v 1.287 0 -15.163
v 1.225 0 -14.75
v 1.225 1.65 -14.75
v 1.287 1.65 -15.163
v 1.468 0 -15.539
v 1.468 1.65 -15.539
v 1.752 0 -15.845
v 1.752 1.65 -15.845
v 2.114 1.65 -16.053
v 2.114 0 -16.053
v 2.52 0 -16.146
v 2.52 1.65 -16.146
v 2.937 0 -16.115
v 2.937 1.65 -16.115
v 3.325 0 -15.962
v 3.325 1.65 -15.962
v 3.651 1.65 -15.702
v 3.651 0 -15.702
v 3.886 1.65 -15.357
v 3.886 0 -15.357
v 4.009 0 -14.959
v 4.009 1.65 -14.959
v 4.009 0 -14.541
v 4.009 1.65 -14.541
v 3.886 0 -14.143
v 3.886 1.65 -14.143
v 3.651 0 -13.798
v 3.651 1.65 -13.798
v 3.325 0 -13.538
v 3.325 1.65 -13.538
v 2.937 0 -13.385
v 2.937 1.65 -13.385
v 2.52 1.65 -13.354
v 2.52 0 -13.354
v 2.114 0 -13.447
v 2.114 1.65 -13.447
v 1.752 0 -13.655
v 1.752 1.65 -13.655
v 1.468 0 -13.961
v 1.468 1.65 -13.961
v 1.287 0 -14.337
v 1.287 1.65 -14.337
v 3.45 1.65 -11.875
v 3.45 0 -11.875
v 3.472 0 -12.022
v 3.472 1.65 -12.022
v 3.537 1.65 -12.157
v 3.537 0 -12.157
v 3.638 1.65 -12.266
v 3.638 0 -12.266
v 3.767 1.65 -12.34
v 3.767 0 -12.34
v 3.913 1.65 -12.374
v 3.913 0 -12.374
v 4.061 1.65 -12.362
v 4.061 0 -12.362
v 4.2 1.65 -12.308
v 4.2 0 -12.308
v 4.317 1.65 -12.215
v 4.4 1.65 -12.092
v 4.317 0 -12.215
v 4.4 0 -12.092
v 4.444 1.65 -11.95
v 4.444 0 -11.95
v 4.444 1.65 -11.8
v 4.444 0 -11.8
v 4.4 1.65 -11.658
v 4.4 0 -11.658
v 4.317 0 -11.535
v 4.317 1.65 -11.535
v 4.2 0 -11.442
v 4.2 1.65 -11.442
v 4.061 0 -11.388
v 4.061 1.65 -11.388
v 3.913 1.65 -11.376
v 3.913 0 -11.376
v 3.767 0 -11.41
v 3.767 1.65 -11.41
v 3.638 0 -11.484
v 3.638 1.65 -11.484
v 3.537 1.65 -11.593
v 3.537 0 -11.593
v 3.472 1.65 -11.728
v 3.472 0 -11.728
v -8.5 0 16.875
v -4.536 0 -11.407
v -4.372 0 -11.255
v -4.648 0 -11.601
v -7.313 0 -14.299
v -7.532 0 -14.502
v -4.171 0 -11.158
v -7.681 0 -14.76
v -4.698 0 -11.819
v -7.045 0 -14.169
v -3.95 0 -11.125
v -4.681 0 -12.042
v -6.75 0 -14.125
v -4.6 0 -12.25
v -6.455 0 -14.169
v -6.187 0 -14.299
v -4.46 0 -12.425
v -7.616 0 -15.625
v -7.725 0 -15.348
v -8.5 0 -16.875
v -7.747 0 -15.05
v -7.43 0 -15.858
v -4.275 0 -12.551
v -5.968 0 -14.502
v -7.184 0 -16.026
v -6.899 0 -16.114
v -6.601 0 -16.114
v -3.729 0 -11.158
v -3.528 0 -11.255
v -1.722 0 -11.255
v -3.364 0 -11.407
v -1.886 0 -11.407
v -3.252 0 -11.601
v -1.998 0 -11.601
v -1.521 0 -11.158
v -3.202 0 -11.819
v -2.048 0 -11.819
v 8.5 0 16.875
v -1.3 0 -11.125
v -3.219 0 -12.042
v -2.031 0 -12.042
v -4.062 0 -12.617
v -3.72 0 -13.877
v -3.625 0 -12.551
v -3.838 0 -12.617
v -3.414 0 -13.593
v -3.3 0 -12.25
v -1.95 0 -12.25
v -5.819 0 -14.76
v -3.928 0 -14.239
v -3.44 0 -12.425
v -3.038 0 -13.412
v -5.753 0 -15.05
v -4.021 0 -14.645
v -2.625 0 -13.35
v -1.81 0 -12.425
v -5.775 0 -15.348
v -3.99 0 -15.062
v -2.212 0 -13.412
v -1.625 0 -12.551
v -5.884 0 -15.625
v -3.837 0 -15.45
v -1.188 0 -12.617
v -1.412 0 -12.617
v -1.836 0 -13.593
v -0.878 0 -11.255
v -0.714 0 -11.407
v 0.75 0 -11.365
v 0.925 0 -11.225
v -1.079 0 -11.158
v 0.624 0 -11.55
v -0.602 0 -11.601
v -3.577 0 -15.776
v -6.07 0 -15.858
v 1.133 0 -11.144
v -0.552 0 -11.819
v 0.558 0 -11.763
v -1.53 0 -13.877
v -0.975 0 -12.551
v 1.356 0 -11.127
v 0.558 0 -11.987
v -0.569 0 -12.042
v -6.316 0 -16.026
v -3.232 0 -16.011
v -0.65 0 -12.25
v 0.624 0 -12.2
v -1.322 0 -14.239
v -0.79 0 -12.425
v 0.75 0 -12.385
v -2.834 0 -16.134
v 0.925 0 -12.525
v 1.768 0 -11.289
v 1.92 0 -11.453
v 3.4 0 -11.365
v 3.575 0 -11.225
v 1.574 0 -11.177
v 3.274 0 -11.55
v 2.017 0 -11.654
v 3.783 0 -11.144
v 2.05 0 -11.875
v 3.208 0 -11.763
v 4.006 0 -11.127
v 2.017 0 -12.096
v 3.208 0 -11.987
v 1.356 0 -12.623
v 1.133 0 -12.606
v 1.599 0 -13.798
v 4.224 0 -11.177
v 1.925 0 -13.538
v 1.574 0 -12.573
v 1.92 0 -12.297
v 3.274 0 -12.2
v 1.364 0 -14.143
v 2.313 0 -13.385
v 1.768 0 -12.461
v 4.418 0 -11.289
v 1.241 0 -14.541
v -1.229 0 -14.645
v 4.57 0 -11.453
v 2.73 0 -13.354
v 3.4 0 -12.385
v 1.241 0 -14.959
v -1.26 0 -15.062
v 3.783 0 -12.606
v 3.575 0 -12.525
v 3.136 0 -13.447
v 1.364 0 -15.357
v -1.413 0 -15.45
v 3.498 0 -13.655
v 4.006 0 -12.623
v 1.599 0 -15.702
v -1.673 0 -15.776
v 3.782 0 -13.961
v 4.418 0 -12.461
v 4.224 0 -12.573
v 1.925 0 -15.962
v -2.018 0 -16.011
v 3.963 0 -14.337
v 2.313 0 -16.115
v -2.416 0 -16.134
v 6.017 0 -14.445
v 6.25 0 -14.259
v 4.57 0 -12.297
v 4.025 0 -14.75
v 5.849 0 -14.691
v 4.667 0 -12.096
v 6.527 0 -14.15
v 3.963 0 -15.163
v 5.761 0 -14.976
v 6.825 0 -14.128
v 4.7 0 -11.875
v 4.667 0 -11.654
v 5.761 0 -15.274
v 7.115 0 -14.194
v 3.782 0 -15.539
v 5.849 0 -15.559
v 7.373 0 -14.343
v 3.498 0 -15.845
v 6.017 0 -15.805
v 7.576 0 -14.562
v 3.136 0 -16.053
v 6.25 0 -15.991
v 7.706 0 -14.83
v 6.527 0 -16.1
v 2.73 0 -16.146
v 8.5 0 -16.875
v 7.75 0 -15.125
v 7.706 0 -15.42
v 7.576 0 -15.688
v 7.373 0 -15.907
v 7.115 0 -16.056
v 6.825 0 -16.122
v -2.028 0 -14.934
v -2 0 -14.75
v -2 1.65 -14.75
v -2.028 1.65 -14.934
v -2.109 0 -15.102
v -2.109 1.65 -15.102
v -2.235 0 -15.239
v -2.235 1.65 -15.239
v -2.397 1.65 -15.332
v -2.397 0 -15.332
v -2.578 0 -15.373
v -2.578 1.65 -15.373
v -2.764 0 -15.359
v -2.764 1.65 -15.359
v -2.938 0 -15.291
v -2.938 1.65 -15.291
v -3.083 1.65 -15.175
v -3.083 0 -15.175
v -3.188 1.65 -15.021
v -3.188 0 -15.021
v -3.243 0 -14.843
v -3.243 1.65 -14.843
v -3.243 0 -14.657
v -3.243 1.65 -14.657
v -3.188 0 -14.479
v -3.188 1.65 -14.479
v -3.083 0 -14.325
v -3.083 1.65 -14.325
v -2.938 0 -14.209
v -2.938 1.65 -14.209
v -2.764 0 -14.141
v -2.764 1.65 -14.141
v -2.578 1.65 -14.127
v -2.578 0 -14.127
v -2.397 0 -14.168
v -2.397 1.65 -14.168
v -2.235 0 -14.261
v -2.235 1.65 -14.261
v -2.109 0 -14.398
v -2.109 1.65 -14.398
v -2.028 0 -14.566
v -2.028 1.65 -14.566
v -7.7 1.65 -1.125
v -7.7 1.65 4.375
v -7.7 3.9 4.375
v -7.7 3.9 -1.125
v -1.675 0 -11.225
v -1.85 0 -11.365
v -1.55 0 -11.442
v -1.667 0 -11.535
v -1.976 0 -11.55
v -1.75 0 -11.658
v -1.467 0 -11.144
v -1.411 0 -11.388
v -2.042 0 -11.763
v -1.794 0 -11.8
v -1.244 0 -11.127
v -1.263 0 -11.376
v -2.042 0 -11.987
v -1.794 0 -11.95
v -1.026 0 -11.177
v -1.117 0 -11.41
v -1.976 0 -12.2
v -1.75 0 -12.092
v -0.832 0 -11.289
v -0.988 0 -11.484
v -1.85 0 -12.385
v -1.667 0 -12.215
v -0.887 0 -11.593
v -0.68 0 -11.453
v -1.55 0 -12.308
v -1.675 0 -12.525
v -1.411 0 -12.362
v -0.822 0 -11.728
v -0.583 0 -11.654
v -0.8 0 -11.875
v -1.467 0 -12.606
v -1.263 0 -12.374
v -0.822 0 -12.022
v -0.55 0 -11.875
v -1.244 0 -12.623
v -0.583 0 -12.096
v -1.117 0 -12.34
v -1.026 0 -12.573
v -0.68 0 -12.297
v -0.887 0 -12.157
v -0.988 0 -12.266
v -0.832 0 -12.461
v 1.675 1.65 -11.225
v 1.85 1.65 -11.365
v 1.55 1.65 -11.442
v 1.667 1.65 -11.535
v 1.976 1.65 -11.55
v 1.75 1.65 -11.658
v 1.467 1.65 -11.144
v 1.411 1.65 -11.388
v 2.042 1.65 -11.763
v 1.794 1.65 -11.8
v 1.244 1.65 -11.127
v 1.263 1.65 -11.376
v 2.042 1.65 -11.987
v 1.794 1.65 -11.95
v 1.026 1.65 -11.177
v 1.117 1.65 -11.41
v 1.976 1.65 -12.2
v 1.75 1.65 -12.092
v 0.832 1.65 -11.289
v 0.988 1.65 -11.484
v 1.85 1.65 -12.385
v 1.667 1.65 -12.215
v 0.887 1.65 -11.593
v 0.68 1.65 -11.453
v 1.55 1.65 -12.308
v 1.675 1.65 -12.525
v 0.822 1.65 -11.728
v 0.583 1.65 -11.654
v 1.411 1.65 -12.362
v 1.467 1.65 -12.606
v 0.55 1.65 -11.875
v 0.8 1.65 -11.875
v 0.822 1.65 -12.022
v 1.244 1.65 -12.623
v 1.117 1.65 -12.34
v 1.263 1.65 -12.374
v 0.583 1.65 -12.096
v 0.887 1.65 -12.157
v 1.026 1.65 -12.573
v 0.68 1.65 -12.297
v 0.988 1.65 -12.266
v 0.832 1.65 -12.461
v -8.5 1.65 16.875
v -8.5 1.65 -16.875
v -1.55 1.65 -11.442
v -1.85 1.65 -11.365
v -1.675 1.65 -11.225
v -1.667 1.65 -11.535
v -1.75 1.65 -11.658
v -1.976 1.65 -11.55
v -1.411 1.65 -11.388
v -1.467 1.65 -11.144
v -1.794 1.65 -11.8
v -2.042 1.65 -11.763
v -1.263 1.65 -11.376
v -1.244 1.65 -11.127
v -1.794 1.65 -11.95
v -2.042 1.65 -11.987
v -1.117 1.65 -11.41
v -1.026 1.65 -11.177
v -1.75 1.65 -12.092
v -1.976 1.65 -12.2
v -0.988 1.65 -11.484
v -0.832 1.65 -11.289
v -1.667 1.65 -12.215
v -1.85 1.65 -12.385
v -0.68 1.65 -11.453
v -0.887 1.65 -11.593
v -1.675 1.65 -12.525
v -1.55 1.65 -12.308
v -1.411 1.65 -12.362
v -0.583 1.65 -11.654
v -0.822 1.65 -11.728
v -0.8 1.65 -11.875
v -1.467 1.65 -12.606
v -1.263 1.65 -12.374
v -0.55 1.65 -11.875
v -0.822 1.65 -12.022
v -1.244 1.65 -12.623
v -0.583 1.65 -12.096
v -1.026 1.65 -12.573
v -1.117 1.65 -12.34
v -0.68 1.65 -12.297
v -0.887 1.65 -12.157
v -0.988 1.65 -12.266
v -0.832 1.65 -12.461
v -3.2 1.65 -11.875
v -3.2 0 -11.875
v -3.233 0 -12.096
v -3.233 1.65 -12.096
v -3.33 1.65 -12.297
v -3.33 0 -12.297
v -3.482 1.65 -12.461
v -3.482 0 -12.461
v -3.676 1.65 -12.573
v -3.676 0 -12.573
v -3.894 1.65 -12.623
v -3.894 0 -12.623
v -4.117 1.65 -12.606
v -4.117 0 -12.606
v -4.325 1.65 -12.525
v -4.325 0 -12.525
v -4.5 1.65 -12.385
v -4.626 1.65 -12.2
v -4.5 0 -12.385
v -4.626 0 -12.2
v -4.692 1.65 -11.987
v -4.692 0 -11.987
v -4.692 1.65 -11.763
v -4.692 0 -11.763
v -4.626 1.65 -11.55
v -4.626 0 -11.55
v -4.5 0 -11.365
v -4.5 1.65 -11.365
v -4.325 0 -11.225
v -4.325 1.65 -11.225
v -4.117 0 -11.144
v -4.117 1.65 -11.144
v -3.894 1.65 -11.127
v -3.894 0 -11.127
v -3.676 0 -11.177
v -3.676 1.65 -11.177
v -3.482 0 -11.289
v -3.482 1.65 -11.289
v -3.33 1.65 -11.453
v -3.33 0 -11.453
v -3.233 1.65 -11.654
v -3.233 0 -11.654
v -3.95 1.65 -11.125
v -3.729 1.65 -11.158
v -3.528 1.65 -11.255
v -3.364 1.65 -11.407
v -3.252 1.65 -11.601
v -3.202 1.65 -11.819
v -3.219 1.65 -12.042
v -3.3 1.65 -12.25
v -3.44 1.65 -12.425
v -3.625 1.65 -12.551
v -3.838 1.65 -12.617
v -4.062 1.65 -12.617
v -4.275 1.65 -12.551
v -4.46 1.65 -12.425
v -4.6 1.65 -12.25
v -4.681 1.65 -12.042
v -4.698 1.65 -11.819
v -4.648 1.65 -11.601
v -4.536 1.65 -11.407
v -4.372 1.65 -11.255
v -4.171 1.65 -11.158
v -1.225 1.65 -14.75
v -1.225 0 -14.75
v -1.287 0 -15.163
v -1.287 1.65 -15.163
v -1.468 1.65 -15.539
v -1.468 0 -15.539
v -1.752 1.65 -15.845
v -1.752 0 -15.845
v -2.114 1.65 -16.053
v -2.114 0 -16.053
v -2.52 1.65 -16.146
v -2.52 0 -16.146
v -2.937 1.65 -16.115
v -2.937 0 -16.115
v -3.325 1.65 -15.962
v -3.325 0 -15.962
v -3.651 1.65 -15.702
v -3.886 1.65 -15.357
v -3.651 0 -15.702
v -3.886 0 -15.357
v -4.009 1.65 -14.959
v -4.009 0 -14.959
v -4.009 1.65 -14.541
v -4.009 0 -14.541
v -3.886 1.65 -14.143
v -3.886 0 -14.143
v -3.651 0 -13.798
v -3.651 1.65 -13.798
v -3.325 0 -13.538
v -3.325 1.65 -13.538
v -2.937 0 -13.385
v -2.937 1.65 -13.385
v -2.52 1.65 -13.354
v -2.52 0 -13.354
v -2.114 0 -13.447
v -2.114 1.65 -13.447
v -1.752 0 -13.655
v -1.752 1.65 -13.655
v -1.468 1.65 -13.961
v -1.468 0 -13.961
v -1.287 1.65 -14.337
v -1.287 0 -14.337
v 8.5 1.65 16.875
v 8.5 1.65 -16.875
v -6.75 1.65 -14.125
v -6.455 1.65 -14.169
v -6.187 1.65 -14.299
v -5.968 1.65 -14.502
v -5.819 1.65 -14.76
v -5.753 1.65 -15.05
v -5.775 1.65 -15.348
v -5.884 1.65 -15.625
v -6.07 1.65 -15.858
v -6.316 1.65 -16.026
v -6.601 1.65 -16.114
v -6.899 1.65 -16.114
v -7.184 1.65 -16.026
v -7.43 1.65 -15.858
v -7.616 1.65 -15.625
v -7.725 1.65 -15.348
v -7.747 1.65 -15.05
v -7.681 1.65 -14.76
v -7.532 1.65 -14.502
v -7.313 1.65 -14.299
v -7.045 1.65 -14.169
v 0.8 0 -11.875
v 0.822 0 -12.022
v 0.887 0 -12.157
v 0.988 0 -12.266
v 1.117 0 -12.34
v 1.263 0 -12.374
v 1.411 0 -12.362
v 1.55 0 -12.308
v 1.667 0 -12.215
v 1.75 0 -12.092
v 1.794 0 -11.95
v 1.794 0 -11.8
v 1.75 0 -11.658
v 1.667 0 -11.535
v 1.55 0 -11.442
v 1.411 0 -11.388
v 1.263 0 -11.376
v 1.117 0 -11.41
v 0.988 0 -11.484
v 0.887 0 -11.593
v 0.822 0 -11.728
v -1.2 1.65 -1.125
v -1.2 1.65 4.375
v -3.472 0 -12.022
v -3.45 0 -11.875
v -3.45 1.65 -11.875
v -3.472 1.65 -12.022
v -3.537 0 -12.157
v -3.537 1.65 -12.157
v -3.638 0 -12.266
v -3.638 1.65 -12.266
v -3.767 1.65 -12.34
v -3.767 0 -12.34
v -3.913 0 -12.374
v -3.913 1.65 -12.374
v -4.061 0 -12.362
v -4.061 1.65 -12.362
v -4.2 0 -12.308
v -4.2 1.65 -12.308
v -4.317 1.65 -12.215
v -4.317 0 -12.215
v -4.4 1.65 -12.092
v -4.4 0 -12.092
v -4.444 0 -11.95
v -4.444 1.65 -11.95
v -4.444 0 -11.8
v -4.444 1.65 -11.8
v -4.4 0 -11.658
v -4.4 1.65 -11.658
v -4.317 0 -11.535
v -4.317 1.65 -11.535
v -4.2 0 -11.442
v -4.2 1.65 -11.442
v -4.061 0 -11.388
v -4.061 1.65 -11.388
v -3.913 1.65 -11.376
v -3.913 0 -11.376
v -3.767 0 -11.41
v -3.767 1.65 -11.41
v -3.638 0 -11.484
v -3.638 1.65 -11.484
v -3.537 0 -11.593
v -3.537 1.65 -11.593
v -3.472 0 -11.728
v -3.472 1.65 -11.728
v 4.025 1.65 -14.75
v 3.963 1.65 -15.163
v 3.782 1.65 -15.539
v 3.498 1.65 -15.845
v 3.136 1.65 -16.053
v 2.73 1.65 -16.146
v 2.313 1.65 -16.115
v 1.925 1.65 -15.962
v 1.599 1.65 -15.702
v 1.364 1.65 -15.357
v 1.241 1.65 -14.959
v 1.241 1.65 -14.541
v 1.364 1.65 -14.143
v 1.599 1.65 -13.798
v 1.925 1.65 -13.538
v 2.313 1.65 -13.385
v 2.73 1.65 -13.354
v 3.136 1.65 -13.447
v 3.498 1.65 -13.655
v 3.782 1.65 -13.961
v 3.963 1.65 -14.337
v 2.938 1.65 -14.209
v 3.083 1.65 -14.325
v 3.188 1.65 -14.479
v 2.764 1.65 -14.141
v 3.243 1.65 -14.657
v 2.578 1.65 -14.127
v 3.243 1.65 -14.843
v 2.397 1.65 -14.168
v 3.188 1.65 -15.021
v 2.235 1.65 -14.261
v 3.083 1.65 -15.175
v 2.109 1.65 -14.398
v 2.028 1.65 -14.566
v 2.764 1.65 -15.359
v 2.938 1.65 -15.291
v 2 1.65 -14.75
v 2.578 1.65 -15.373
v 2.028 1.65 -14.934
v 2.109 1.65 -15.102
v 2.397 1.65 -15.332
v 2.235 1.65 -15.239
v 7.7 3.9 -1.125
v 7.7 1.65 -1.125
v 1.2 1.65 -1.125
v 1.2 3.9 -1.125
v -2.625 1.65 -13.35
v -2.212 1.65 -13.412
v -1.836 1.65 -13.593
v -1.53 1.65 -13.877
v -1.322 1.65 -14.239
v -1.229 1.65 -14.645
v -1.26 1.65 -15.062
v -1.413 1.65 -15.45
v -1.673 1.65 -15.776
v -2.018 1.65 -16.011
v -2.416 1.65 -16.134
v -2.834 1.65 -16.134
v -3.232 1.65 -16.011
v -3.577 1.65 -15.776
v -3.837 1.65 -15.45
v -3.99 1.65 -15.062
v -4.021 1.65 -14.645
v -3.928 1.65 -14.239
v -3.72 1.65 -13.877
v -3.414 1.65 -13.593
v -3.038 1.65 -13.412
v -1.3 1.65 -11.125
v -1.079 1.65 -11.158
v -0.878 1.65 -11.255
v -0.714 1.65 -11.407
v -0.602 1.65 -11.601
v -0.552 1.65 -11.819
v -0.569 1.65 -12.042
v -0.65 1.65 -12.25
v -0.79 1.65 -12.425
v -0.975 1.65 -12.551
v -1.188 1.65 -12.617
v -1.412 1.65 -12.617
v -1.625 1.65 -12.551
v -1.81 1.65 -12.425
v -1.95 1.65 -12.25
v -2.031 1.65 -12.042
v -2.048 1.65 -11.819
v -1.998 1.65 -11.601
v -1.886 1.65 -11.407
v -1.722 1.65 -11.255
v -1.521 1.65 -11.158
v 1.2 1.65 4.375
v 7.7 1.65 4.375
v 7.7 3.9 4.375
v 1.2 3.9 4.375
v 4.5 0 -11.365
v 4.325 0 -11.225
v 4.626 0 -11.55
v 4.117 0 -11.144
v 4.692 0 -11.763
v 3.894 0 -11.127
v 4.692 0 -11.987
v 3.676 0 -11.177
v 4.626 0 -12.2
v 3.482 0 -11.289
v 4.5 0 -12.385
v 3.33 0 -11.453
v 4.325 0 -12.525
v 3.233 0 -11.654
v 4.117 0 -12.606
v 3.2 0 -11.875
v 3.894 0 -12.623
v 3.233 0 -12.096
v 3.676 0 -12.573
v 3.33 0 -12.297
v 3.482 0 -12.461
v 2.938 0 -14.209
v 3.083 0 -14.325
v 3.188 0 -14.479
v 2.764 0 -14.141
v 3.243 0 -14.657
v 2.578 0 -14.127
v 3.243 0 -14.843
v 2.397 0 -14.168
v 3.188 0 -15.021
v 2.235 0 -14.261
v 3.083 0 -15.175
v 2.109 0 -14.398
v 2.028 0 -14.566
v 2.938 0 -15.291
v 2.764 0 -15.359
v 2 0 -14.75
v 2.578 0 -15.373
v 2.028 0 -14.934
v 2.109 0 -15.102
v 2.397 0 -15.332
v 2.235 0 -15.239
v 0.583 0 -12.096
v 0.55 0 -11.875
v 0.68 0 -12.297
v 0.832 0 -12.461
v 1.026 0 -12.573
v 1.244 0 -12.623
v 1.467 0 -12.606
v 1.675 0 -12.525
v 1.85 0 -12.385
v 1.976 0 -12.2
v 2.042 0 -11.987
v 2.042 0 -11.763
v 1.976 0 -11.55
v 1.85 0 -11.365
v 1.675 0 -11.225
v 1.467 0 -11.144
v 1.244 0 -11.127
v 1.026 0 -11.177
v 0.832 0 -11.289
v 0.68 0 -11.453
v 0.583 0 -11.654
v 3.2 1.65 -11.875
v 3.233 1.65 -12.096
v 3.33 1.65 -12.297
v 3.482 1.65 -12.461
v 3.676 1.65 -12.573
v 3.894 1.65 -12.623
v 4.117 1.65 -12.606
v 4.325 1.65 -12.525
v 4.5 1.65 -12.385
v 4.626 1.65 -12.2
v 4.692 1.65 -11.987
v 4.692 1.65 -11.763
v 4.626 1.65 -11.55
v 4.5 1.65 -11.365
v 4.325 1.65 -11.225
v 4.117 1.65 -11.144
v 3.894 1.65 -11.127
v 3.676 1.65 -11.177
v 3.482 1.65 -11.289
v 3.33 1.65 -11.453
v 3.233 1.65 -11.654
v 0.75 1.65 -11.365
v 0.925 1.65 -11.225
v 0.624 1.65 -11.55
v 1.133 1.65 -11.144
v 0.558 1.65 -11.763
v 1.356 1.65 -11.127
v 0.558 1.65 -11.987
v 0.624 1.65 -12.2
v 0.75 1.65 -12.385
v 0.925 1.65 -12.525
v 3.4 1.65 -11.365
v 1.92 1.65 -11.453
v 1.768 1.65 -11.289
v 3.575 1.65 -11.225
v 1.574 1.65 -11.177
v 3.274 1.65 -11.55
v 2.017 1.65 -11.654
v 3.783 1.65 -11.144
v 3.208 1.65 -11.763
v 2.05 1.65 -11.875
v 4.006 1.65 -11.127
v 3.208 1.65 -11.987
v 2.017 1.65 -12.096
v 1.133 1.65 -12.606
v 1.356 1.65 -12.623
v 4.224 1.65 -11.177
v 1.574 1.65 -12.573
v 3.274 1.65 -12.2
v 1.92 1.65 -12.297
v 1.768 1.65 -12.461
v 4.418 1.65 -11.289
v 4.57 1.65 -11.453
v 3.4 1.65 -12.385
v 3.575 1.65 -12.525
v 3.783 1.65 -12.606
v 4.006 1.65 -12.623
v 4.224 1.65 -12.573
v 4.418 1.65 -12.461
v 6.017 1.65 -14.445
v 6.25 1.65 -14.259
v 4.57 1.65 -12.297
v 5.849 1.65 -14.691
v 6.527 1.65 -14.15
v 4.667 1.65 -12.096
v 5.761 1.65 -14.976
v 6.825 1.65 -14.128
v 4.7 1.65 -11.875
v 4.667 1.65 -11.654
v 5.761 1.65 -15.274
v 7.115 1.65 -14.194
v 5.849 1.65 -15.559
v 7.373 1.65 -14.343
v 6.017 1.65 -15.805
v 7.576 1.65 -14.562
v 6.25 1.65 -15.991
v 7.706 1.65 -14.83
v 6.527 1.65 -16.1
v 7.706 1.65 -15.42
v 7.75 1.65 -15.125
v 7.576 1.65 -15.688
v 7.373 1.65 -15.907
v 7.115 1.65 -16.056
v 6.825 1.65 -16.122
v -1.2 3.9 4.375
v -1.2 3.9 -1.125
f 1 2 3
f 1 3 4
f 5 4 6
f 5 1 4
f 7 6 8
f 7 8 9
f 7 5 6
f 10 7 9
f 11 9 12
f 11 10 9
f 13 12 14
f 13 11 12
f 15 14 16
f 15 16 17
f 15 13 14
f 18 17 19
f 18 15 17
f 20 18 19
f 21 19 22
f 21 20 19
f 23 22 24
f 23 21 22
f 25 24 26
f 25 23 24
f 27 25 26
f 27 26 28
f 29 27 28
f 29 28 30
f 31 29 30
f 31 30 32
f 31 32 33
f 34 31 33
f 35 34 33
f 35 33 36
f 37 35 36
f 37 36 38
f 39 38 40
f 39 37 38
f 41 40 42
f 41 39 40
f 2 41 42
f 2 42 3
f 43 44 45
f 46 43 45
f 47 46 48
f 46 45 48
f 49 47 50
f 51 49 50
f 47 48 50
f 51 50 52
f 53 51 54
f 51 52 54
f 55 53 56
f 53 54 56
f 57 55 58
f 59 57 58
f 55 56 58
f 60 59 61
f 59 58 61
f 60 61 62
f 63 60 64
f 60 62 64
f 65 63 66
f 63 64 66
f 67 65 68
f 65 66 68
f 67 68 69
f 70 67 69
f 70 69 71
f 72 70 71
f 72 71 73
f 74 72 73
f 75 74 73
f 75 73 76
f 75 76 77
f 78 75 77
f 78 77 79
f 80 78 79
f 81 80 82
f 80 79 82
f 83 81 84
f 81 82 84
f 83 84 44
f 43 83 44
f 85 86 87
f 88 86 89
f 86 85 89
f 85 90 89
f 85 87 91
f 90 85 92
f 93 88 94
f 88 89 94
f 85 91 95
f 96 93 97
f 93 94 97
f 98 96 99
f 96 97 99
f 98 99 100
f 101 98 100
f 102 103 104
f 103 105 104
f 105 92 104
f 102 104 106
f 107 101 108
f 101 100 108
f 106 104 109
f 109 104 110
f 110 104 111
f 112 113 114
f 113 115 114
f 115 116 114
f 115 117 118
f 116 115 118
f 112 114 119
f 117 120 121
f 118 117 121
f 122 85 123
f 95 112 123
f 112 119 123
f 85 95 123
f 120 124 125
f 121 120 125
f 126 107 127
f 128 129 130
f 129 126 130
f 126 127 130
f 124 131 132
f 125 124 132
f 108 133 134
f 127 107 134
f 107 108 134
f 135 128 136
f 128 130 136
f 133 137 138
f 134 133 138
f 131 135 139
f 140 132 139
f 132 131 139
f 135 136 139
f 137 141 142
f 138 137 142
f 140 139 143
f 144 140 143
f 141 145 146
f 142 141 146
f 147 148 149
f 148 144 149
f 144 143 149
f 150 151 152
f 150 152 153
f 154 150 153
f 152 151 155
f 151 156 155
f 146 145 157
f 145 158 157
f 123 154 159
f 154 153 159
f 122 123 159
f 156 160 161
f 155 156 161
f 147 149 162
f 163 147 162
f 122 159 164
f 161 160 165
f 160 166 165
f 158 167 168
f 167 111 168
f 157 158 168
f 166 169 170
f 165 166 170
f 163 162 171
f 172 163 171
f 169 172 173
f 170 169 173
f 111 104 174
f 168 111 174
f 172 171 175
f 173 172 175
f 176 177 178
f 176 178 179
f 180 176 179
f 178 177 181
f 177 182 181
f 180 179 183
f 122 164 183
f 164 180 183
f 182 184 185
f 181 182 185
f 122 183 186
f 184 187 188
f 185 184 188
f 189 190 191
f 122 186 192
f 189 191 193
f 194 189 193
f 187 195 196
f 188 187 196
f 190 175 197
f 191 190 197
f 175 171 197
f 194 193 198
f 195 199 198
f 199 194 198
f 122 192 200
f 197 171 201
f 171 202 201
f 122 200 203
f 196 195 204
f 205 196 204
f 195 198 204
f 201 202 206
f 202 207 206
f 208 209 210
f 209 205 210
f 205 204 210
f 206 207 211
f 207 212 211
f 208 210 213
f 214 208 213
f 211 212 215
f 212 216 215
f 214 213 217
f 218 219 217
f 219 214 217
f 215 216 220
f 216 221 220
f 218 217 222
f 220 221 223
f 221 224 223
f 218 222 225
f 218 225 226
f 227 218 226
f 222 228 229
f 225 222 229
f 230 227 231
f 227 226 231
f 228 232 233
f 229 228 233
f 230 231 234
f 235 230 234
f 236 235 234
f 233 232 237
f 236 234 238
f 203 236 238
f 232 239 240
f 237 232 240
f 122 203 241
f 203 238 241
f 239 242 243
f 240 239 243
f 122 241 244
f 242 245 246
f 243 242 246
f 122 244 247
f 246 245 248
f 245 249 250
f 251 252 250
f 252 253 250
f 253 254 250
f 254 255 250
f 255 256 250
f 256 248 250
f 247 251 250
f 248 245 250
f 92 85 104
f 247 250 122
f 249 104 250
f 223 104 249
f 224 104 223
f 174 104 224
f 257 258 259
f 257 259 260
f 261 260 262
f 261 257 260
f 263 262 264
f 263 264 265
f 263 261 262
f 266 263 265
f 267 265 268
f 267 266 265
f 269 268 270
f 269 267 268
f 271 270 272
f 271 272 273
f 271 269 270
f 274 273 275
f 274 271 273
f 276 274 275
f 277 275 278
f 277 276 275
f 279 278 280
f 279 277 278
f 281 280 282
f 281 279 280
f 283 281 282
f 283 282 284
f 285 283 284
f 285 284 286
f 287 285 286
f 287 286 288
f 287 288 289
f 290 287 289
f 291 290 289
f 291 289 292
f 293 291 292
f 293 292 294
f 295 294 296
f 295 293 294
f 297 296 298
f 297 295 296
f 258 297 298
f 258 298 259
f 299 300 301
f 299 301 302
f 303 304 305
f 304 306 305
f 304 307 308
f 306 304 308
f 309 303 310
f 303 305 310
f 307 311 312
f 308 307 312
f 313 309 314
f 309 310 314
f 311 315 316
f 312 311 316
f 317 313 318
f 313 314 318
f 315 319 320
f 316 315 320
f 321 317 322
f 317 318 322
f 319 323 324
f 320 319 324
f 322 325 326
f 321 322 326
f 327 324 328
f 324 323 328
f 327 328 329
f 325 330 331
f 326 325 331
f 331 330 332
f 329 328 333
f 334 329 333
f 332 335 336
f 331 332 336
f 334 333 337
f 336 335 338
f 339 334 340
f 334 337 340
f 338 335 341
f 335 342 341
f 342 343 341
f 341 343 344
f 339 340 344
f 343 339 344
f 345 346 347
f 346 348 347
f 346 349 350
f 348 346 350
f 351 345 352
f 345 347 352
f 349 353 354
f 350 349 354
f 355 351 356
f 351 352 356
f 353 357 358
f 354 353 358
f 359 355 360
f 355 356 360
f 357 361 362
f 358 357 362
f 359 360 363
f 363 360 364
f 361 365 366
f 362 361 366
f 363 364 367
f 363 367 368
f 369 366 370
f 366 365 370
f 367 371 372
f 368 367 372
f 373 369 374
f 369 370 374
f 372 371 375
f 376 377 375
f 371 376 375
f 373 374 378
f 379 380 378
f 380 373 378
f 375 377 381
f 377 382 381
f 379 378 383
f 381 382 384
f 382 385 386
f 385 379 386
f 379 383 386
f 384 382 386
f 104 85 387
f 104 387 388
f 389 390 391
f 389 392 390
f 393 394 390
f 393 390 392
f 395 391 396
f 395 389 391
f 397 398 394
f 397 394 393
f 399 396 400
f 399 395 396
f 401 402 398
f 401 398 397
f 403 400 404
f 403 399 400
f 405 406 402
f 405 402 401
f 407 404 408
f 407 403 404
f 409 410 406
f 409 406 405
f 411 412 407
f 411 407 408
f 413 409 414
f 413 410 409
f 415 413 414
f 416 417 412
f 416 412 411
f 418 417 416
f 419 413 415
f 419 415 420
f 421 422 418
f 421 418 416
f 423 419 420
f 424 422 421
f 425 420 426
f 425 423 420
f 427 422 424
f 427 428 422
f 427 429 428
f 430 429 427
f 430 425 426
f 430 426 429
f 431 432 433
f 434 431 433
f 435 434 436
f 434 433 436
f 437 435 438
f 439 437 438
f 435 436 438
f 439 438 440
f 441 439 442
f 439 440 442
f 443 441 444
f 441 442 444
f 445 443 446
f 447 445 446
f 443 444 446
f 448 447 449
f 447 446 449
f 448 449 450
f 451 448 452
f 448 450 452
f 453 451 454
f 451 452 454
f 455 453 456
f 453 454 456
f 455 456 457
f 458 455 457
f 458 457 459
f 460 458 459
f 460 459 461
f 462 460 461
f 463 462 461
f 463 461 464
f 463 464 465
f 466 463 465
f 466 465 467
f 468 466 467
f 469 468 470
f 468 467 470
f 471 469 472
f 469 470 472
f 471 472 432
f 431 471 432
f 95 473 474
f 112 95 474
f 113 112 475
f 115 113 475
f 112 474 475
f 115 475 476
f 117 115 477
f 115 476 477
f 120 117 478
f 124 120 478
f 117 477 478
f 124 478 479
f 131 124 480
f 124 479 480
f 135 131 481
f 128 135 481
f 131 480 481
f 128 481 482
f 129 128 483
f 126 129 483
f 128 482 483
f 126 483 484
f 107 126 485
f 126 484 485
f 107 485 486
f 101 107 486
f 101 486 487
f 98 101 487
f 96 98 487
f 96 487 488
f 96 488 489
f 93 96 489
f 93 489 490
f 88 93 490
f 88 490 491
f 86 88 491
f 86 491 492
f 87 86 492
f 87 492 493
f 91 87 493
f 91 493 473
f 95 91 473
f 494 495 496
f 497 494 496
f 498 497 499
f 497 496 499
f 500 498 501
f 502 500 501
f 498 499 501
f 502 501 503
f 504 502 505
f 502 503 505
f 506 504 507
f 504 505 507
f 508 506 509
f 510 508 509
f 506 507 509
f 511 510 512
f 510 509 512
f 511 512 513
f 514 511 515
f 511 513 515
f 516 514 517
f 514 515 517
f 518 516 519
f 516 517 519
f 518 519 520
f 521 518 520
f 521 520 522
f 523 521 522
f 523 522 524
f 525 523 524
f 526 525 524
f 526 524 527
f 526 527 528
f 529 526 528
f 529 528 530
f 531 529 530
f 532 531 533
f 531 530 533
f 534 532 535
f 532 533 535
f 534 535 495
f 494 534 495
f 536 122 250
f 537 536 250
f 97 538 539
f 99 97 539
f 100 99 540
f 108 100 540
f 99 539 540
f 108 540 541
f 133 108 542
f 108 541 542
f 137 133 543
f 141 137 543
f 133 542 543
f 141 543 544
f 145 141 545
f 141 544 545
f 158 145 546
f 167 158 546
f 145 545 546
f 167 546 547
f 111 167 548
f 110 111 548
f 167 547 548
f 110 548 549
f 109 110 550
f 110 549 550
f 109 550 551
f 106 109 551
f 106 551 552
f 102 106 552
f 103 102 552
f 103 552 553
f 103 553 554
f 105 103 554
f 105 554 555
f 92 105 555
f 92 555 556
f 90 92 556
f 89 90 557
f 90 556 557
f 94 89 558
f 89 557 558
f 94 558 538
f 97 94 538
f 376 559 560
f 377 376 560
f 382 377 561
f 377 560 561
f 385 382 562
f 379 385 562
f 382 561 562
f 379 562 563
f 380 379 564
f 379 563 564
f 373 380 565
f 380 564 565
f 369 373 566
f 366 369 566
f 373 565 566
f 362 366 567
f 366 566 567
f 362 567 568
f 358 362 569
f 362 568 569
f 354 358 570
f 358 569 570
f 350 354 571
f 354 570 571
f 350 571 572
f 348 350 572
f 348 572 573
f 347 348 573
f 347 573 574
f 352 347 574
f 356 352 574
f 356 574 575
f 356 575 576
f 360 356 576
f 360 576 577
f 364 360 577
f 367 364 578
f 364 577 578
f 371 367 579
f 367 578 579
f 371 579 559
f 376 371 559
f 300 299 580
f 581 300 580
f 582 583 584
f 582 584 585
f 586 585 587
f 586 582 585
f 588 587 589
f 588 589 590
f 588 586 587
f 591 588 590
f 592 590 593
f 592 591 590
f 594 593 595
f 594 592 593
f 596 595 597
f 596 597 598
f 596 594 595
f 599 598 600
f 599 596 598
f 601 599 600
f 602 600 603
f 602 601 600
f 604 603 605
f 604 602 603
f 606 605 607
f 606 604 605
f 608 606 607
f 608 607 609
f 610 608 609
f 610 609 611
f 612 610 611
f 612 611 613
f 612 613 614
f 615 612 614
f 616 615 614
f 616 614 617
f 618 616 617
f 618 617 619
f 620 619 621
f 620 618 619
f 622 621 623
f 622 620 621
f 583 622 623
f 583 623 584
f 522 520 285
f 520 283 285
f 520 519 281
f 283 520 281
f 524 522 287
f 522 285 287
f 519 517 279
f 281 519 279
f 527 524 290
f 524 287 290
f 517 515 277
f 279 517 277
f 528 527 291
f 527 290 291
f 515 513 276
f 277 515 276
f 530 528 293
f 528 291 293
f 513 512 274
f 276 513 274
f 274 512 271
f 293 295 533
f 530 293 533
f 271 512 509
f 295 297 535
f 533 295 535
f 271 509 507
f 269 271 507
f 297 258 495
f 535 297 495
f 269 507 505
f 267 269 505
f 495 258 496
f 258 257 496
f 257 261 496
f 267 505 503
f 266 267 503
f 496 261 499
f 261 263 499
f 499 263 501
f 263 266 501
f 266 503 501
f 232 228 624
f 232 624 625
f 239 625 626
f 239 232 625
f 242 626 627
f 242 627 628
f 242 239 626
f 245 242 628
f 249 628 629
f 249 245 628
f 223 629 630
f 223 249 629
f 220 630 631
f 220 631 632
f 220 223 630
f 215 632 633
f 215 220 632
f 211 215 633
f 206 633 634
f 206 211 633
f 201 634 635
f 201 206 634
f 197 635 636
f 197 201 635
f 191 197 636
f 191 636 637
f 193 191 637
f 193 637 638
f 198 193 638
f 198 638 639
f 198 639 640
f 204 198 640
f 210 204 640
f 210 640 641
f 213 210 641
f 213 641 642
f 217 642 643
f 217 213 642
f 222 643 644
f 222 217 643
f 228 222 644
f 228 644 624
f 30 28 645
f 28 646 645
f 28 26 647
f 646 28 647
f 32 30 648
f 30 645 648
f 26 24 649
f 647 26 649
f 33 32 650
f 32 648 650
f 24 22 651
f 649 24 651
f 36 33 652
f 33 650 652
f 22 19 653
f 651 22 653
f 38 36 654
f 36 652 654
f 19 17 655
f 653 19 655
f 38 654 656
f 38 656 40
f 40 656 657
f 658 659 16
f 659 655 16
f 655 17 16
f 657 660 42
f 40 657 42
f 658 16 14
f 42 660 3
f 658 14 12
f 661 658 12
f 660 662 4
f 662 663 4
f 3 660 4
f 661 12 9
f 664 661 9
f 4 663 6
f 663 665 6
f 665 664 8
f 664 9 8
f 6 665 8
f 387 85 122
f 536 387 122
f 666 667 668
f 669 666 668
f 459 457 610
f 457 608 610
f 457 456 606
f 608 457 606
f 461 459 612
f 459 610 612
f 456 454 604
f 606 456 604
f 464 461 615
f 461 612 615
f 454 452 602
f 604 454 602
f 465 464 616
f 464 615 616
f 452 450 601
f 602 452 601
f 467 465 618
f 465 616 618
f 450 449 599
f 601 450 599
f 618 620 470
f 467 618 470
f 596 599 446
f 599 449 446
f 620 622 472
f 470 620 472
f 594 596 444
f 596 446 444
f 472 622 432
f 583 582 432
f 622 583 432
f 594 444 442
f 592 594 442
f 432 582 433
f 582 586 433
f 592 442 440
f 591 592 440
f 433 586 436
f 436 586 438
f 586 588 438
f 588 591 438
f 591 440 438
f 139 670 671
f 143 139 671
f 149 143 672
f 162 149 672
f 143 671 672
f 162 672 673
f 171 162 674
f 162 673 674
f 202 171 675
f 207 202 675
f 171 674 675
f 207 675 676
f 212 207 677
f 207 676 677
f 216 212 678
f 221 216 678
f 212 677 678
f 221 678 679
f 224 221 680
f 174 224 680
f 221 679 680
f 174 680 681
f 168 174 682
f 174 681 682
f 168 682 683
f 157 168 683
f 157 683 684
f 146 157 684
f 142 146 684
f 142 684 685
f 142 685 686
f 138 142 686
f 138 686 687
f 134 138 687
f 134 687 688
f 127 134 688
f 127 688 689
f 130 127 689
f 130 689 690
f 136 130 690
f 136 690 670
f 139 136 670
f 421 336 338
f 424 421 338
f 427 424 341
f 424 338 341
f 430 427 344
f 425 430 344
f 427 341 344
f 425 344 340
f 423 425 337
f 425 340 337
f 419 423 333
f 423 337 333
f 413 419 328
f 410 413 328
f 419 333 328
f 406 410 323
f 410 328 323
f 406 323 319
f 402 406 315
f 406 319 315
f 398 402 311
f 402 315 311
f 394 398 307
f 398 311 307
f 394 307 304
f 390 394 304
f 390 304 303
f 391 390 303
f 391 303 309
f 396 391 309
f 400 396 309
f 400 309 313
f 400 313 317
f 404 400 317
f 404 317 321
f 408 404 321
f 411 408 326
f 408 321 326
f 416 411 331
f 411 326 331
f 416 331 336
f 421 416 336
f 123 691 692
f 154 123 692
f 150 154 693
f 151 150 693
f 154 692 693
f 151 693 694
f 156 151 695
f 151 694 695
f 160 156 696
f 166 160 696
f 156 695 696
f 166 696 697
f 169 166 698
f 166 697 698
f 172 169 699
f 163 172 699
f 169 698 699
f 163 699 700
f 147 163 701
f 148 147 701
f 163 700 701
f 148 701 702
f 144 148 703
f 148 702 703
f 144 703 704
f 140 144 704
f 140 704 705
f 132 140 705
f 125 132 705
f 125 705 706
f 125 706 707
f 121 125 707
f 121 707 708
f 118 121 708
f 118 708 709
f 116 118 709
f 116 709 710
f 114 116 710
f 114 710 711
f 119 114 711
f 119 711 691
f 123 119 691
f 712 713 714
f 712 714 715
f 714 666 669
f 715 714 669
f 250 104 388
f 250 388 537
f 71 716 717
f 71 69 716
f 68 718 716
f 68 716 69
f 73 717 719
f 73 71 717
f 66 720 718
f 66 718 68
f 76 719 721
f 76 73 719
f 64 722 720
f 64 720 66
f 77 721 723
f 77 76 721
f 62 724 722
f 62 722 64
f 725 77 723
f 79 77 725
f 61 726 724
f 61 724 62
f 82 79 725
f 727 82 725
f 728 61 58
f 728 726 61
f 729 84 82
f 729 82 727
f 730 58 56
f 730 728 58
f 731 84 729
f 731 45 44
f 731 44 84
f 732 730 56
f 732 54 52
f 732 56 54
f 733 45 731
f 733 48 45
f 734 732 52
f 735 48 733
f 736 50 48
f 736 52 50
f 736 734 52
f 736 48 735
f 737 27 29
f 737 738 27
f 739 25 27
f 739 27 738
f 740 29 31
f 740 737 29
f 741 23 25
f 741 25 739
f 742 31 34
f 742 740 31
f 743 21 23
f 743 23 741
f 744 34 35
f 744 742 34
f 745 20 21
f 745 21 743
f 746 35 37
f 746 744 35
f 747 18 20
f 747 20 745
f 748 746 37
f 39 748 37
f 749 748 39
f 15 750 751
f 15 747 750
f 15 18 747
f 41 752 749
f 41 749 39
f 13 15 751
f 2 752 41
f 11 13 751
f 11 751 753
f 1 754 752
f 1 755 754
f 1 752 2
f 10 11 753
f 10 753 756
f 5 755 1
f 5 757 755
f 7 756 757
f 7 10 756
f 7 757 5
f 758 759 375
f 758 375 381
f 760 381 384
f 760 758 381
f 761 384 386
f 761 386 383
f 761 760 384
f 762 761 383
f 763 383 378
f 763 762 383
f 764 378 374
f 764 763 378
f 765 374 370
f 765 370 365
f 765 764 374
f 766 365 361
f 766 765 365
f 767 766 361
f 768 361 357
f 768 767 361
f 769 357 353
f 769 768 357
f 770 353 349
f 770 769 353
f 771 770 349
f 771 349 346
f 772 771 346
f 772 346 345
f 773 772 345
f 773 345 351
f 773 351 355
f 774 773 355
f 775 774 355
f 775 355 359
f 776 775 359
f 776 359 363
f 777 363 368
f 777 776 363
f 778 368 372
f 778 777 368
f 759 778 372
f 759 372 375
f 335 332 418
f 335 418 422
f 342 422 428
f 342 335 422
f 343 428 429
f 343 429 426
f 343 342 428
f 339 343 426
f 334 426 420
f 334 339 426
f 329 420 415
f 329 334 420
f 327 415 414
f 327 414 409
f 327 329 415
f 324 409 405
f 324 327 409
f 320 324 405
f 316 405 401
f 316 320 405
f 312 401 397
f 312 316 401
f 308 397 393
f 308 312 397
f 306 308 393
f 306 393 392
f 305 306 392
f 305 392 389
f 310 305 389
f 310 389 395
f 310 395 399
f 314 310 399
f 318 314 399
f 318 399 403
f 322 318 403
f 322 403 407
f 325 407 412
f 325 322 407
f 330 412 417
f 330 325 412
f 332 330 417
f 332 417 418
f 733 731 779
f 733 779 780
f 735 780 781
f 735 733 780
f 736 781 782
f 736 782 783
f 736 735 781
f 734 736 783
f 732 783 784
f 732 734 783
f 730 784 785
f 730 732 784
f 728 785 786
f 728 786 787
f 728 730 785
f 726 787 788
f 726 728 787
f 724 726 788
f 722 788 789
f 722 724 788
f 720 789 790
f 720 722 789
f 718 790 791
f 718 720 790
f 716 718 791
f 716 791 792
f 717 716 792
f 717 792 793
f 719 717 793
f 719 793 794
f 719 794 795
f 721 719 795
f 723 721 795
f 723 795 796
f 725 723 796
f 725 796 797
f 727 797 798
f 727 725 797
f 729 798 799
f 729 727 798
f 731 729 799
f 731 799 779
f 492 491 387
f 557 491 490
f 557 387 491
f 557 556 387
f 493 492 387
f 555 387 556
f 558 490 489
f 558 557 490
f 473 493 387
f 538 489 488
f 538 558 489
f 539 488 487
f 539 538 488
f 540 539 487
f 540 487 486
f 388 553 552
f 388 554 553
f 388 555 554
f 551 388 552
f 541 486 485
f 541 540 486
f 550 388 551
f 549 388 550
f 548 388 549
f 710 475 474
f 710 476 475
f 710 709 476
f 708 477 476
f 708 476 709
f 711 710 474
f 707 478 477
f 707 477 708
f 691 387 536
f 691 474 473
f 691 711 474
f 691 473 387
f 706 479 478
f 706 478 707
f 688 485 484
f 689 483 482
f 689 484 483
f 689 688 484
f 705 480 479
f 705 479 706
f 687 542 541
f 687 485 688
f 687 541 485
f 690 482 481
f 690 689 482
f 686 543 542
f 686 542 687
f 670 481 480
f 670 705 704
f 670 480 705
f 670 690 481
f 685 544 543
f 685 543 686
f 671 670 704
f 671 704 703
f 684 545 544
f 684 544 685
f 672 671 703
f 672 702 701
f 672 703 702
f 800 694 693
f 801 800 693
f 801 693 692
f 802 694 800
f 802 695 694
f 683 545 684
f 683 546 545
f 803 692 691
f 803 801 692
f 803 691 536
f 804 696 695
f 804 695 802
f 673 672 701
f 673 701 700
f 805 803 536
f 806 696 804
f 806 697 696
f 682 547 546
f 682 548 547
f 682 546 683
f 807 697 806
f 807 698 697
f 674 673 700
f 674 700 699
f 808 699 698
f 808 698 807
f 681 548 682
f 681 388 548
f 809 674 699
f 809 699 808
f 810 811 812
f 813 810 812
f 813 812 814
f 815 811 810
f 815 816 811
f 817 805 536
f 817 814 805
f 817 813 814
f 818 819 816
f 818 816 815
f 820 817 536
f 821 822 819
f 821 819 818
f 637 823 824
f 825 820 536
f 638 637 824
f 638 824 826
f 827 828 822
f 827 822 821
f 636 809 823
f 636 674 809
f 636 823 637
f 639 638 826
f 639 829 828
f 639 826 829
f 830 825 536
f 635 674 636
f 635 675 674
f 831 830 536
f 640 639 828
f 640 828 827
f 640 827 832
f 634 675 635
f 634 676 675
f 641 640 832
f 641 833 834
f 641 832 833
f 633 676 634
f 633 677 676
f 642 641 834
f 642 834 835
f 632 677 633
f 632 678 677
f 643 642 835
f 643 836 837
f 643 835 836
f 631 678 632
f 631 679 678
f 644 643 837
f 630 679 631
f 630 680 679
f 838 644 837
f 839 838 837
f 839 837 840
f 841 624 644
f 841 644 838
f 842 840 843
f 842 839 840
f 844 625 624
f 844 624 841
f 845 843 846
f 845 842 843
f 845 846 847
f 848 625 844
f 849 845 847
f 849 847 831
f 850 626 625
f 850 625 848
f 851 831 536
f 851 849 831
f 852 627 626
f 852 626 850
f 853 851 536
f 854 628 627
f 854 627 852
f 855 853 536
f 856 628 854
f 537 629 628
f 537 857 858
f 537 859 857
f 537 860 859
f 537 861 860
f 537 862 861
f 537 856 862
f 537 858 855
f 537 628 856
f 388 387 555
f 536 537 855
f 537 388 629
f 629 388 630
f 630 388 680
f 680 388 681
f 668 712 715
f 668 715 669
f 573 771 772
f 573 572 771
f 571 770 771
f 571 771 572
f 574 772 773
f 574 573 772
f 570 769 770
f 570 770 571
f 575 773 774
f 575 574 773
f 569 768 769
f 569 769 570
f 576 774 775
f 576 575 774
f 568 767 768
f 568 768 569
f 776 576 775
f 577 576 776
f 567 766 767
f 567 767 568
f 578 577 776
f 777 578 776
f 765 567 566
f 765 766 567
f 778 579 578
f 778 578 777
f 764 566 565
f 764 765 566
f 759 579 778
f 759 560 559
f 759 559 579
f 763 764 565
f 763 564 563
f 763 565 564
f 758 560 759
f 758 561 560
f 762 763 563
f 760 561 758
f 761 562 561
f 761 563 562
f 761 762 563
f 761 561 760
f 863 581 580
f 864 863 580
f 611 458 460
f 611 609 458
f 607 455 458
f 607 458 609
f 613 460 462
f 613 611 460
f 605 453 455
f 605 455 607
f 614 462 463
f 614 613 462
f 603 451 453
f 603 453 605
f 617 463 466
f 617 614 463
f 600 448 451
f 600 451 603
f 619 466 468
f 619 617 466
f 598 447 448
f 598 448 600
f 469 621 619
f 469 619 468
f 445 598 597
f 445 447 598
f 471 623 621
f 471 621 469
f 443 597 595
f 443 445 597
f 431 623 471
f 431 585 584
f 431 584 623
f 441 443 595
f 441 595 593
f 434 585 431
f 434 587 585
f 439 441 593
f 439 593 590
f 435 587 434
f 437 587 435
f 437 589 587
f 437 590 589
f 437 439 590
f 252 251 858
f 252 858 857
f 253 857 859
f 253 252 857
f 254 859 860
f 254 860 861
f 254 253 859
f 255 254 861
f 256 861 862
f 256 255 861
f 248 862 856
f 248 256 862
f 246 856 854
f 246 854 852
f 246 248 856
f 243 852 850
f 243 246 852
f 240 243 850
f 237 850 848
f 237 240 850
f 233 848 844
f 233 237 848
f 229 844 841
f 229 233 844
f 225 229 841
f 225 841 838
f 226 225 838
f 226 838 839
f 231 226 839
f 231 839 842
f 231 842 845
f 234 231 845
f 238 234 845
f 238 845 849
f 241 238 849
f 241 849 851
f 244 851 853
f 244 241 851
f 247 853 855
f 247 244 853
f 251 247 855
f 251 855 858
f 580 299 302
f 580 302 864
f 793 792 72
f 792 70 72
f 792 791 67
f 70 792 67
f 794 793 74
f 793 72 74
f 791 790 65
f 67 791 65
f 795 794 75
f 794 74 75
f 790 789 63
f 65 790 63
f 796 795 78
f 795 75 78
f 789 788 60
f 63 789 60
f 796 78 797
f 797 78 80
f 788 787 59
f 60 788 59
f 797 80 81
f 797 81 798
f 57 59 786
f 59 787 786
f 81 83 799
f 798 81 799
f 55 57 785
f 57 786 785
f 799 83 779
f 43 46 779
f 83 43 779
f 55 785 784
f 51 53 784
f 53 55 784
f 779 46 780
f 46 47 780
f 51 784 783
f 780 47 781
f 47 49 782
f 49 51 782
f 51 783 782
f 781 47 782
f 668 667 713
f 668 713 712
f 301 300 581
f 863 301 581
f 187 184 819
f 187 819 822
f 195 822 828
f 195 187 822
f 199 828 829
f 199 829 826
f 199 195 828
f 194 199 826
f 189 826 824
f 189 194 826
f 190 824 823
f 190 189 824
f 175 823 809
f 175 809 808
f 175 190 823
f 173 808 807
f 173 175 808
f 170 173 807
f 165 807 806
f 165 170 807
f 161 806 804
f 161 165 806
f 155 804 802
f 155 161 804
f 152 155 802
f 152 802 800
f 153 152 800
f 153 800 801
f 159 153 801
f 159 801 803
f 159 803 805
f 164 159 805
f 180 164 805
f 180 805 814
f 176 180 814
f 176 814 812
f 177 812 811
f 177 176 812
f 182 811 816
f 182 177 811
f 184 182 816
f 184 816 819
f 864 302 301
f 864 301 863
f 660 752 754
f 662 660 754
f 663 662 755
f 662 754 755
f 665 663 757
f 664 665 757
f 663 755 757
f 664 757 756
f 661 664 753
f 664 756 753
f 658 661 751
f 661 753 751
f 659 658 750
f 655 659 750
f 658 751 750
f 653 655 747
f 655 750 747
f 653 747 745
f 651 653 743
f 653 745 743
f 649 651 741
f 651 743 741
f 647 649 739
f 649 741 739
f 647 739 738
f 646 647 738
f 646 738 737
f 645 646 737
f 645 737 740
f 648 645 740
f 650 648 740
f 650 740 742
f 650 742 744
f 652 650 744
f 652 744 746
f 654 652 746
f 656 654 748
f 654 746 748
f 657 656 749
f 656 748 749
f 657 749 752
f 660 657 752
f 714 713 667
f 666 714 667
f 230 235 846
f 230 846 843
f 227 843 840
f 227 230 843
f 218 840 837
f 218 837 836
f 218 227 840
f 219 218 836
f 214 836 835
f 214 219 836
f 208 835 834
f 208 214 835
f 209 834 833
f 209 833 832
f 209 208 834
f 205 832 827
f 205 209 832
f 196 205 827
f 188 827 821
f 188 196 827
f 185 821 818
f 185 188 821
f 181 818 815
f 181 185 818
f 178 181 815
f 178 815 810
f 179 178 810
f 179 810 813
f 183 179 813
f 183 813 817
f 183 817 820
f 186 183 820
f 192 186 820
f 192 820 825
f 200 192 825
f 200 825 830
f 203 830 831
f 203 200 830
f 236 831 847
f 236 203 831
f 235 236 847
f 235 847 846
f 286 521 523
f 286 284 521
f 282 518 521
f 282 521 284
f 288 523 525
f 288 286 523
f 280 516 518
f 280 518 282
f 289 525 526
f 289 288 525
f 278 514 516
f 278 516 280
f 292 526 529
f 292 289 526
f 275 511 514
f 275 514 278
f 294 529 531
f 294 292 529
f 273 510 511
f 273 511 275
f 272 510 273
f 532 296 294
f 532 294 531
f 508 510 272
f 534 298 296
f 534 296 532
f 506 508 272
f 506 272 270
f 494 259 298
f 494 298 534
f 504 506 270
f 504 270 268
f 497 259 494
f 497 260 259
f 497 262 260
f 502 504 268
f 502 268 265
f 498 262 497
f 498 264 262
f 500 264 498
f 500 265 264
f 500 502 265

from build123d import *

# Parameters (mm, degrees)
PCB_SKETCH_W                     = 17
PCB_SKETCH_H                     = 33.75
PCB_EXTRUDE_DEPTH                = 1.65
THROUGH_HOLE_SKETCH_R            = 1.4
THROUGH_HOLE_SKETCH_R_2          = 0.625
THROUGH_HOLE_SKETCH_R_3          = 0.75
THROUGH_HOLE_SKETCH_R_4          = 0.5
THROUGH_HOLE_CUT_DEPTH           = 19.966763693
MOUNTING_HOLES_SKETCH_R          = 1
MOUNTING_HOLE_CUT_DEPTH          = 1.65
HOLES_MIRROR_OUTLINE_R           = 1.4
HOLES_MIRROR_OUTLINE_R_2         = 0.75
HOLES_MIRROR_OUTLINE_R_3         = 1
HOLES_MIRROR_DEPTH               = 1.65
THROUGH_HOLE_EXTRUDE_OUTLINE_R   = 0.75
THROUGH_HOLE_EXTRUDE_OUTLINE_R_2 = 0.5
THROUGH_HOLE_EXTRUDE_OUTLINE_R_3 = 1.4
THROUGH_HOLE_EXTRUDE_OUTLINE_R_4 = 0.625
THROUGH_HOLE_EXTRUDE_DEPTH       = 1.65
MOSFET_SKETCH_W                  = 6.5
MOSFET_SKETCH_H                  = 5.5
MOSFET_EXTRUDE_DEPTH             = 2.25


# Read off the part's stored shape, not the designer's step: Holes Mirror, Through Hole Extrude
with BuildPart() as part:
    # PCB Sketch → PCB Extrude (new body)
    with BuildSketch(Plane(origin=(0, 0, 0), x_dir=(1, 0, 0), z_dir=(0, 1, 0))):
        Rectangle(PCB_SKETCH_W, PCB_SKETCH_H)
    extrude(amount=PCB_EXTRUDE_DEPTH)

    # Through Hole Sketch → Through Hole Cut (cut, through all)
    # profile 1 of 4: a face of its own
    with BuildSketch(Plane(origin=(0, 1.65, 0), x_dir=(1, 0, 0), z_dir=(0, 1, 0))):
        with Locations(Location((-2.625, 14.75, 0), (0, 0, 270))):
            Circle(THROUGH_HOLE_SKETCH_R)
        with Locations((-2.625, 14.75)):
            Circle(THROUGH_HOLE_SKETCH_R_2, mode=Mode.SUBTRACT)
    # profile 2 of 4: a face of its own
    with BuildSketch(Plane(origin=(0, 1.65, 0), x_dir=(1, 0, 0), z_dir=(0, 1, 0))):
        with Locations((-2.625, 14.75)):
            Circle(THROUGH_HOLE_SKETCH_R_2)
    # profile 3 of 4: a face of its own
    with BuildSketch(Plane(origin=(0, 1.65, 0), x_dir=(1, 0, 0), z_dir=(0, 1, 0))):
        with Locations(Location((-1.3, 11.875, 0), (0, 0, 270))):
            Circle(THROUGH_HOLE_SKETCH_R_3)
        with Locations((-1.3, 11.875)):
            Circle(THROUGH_HOLE_SKETCH_R_4, mode=Mode.SUBTRACT)
    # profile 4 of 4: a face of its own
    with BuildSketch(Plane(origin=(0, 1.65, 0), x_dir=(1, 0, 0), z_dir=(0, 1, 0))):
        with Locations(Location((-3.95, 11.875, 0), (0, 0, 270))):
            Circle(THROUGH_HOLE_SKETCH_R_3)
    extrude(amount=-THROUGH_HOLE_CUT_DEPTH, mode=Mode.SUBTRACT)


with BuildPart() as through_hole_cut_kept_piece:
    # of the separate pieces the step leaves, the one the design keeps (through_hole_cut_pieces_kept)
    add(part.part.solids().sort_by_distance((-8.5, 0, 16.875))[0])

    # Mounting Holes Sketch → Mounting Hole Cut (cut)
    with BuildSketch(Plane(origin=(0, 1.65, 0), x_dir=(1, 0, 0), z_dir=(0, 1, 0))):
        with Locations(Location((-6.75, 15.125, 0), (0, 0, 270))):
            Circle(MOUNTING_HOLES_SKETCH_R)
    extrude(amount=-MOUNTING_HOLE_CUT_DEPTH, mode=Mode.SUBTRACT)

    # Holes Mirror outline → Holes Mirror (cut)
    with BuildSketch(Plane(origin=(0, 0, 0), x_dir=(1, 0, 0), z_dir=(0, 1, 0))):
        with Locations((2.625, 14.75)):
            Circle(HOLES_MIRROR_OUTLINE_R)
        with Locations((1.3, 11.875)):
            Circle(HOLES_MIRROR_OUTLINE_R_2)
        with Locations((3.95, 11.875)):
            Circle(HOLES_MIRROR_OUTLINE_R_2)
        with Locations((6.75, 15.125)):
            Circle(HOLES_MIRROR_OUTLINE_R_3)
    extrude(amount=HOLES_MIRROR_DEPTH, mode=Mode.SUBTRACT)


with BuildPart() as body_2:
    # Through Hole Extrude outline → Through Hole Extrude (new body)
    # profile 1 of 3: a face of its own
    with BuildSketch(Plane(origin=(0, 0, 0), x_dir=(1, 0, 0), z_dir=(0, 1, 0))):
        with Locations((-3.95, 11.875)):
            Circle(THROUGH_HOLE_EXTRUDE_OUTLINE_R)
        with Locations((-3.95, 11.875)):
            Circle(THROUGH_HOLE_EXTRUDE_OUTLINE_R_2, mode=Mode.SUBTRACT)
    # profile 2 of 3: a face of its own
    with BuildSketch(Plane(origin=(0, 0, 0), x_dir=(1, 0, 0), z_dir=(0, 1, 0))):
        with Locations((-1.3, 11.875)):
            Circle(THROUGH_HOLE_EXTRUDE_OUTLINE_R)
        with Locations((-1.3, 11.875)):
            Circle(THROUGH_HOLE_EXTRUDE_OUTLINE_R_2, mode=Mode.SUBTRACT)
    # profile 3 of 3: a face of its own
    with BuildSketch(Plane(origin=(0, 0, 0), x_dir=(1, 0, 0), z_dir=(0, 1, 0))):
        with Locations((-2.625, 14.75)):
            Circle(THROUGH_HOLE_EXTRUDE_OUTLINE_R_3)
        with Locations((-2.625, 14.75)):
            Circle(THROUGH_HOLE_EXTRUDE_OUTLINE_R_4, mode=Mode.SUBTRACT)
    extrude(amount=THROUGH_HOLE_EXTRUDE_DEPTH)


with BuildPart() as body_3:
    # Mosfet Sketch → Mosfet Extrude (new body)
    with BuildSketch(Plane(origin=(0, 1.65, 0), x_dir=(1, 0, 0), z_dir=(0, 1, 0))):
        with Locations((-4.45, -1.625)):
            Rectangle(MOSFET_SKETCH_W, MOSFET_SKETCH_H)
    extrude(amount=MOSFET_EXTRUDE_DEPTH)


with BuildPart() as body_4:
    # Bodies Mirror: mirrored copy
    add(body_2.part.mirror(Plane(origin=(0, 0, 0), x_dir=(0, 0, 1), z_dir=(1, 0, 0))))


with BuildPart() as body_5:
    # Bodies Mirror 2: mirrored copy
    add(body_3.part.mirror(Plane(origin=(0, 0, 0), x_dir=(0, 0, 1), z_dir=(1, 0, 0))))


solid = Compound([through_hole_cut_kept_piece.part, body_2.part, body_3.part, body_4.part, body_5.part])
